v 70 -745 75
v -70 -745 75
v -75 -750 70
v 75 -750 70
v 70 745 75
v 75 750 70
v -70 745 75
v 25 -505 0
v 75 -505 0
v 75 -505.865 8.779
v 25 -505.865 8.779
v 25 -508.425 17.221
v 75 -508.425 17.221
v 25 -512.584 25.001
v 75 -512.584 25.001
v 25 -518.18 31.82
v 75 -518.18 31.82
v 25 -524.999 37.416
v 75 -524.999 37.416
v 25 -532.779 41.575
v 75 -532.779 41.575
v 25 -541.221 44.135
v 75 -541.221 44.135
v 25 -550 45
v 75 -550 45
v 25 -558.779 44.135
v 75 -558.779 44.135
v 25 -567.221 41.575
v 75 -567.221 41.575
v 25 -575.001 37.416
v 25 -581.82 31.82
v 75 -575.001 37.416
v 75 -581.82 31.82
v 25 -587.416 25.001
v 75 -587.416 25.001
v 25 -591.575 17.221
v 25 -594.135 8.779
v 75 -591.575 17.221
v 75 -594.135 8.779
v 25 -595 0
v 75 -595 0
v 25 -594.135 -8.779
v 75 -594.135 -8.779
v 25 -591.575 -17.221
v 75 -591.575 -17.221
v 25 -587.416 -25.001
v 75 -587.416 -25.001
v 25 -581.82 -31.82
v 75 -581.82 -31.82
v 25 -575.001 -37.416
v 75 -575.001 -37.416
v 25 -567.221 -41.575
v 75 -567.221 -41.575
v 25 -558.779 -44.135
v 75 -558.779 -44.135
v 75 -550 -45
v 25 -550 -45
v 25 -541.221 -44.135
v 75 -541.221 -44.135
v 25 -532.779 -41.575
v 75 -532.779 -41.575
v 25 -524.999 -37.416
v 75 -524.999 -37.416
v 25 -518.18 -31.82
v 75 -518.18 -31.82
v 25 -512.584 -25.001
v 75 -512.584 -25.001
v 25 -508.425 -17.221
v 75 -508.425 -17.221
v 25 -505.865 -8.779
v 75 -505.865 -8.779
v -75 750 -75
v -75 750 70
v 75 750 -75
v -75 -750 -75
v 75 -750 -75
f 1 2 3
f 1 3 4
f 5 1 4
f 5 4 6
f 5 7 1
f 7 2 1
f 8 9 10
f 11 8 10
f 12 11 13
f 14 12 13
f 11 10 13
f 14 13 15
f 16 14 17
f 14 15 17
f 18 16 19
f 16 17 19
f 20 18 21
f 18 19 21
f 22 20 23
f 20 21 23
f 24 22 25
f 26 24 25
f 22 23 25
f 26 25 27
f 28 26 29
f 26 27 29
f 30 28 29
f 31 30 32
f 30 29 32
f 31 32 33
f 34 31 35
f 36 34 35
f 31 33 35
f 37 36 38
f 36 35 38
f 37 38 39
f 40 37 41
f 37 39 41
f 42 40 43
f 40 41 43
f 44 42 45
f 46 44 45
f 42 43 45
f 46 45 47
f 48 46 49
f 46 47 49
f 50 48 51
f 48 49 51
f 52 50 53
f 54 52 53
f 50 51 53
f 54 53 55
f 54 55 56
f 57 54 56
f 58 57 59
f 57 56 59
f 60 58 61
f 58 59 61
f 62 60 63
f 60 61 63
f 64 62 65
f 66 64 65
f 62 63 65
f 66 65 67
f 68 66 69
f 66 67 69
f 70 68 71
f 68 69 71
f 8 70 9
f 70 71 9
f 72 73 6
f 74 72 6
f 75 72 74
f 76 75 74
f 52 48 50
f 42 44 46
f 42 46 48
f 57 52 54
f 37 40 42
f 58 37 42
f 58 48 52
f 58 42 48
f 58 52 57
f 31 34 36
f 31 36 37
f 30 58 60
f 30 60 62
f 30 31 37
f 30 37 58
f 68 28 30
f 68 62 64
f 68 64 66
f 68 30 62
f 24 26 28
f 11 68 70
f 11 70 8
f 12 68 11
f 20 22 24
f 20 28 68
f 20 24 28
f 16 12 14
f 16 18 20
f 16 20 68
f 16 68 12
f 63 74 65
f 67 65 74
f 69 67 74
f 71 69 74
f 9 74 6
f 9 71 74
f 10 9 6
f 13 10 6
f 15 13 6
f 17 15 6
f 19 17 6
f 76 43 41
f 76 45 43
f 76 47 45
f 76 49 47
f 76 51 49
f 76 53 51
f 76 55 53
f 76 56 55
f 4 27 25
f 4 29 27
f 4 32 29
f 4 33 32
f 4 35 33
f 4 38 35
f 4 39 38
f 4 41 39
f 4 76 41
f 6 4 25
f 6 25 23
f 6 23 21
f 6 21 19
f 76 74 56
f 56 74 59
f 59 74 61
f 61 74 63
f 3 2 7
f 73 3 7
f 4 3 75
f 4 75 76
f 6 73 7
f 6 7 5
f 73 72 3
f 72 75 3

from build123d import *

# Parameters (mm, degrees)
F0_W     = 150
F0_H     = 150
F1_DEPTH = 750
F2_SIZE  = 5
F3_R     = 45
F4_DEPTH = 50


with BuildPart() as f1:
    # F0 (on Front) → F1 (new body, symmetric)
    with BuildSketch(Plane.XZ):
        Rectangle(F0_W, F0_H)
    extrude(amount=F1_DEPTH, both=True)

    # F2
    f2_edges = [f1.edges().sort_by_distance(p)[0] for p in [
        (0, 750, 75),
        (-75, 0, 75),
        (0, -750, 75),
        (75, 0, 75),
    ]]
    chamfer(f2_edges, length=F2_SIZE)

    # F3 (on face) → F4 (cut)
    with BuildSketch(Plane.YZ.offset(75)):
        with Locations((-550, 0)):
            Circle(F3_R)
    extrude(amount=-F4_DEPTH, mode=Mode.SUBTRACT)


solid = f1.part
